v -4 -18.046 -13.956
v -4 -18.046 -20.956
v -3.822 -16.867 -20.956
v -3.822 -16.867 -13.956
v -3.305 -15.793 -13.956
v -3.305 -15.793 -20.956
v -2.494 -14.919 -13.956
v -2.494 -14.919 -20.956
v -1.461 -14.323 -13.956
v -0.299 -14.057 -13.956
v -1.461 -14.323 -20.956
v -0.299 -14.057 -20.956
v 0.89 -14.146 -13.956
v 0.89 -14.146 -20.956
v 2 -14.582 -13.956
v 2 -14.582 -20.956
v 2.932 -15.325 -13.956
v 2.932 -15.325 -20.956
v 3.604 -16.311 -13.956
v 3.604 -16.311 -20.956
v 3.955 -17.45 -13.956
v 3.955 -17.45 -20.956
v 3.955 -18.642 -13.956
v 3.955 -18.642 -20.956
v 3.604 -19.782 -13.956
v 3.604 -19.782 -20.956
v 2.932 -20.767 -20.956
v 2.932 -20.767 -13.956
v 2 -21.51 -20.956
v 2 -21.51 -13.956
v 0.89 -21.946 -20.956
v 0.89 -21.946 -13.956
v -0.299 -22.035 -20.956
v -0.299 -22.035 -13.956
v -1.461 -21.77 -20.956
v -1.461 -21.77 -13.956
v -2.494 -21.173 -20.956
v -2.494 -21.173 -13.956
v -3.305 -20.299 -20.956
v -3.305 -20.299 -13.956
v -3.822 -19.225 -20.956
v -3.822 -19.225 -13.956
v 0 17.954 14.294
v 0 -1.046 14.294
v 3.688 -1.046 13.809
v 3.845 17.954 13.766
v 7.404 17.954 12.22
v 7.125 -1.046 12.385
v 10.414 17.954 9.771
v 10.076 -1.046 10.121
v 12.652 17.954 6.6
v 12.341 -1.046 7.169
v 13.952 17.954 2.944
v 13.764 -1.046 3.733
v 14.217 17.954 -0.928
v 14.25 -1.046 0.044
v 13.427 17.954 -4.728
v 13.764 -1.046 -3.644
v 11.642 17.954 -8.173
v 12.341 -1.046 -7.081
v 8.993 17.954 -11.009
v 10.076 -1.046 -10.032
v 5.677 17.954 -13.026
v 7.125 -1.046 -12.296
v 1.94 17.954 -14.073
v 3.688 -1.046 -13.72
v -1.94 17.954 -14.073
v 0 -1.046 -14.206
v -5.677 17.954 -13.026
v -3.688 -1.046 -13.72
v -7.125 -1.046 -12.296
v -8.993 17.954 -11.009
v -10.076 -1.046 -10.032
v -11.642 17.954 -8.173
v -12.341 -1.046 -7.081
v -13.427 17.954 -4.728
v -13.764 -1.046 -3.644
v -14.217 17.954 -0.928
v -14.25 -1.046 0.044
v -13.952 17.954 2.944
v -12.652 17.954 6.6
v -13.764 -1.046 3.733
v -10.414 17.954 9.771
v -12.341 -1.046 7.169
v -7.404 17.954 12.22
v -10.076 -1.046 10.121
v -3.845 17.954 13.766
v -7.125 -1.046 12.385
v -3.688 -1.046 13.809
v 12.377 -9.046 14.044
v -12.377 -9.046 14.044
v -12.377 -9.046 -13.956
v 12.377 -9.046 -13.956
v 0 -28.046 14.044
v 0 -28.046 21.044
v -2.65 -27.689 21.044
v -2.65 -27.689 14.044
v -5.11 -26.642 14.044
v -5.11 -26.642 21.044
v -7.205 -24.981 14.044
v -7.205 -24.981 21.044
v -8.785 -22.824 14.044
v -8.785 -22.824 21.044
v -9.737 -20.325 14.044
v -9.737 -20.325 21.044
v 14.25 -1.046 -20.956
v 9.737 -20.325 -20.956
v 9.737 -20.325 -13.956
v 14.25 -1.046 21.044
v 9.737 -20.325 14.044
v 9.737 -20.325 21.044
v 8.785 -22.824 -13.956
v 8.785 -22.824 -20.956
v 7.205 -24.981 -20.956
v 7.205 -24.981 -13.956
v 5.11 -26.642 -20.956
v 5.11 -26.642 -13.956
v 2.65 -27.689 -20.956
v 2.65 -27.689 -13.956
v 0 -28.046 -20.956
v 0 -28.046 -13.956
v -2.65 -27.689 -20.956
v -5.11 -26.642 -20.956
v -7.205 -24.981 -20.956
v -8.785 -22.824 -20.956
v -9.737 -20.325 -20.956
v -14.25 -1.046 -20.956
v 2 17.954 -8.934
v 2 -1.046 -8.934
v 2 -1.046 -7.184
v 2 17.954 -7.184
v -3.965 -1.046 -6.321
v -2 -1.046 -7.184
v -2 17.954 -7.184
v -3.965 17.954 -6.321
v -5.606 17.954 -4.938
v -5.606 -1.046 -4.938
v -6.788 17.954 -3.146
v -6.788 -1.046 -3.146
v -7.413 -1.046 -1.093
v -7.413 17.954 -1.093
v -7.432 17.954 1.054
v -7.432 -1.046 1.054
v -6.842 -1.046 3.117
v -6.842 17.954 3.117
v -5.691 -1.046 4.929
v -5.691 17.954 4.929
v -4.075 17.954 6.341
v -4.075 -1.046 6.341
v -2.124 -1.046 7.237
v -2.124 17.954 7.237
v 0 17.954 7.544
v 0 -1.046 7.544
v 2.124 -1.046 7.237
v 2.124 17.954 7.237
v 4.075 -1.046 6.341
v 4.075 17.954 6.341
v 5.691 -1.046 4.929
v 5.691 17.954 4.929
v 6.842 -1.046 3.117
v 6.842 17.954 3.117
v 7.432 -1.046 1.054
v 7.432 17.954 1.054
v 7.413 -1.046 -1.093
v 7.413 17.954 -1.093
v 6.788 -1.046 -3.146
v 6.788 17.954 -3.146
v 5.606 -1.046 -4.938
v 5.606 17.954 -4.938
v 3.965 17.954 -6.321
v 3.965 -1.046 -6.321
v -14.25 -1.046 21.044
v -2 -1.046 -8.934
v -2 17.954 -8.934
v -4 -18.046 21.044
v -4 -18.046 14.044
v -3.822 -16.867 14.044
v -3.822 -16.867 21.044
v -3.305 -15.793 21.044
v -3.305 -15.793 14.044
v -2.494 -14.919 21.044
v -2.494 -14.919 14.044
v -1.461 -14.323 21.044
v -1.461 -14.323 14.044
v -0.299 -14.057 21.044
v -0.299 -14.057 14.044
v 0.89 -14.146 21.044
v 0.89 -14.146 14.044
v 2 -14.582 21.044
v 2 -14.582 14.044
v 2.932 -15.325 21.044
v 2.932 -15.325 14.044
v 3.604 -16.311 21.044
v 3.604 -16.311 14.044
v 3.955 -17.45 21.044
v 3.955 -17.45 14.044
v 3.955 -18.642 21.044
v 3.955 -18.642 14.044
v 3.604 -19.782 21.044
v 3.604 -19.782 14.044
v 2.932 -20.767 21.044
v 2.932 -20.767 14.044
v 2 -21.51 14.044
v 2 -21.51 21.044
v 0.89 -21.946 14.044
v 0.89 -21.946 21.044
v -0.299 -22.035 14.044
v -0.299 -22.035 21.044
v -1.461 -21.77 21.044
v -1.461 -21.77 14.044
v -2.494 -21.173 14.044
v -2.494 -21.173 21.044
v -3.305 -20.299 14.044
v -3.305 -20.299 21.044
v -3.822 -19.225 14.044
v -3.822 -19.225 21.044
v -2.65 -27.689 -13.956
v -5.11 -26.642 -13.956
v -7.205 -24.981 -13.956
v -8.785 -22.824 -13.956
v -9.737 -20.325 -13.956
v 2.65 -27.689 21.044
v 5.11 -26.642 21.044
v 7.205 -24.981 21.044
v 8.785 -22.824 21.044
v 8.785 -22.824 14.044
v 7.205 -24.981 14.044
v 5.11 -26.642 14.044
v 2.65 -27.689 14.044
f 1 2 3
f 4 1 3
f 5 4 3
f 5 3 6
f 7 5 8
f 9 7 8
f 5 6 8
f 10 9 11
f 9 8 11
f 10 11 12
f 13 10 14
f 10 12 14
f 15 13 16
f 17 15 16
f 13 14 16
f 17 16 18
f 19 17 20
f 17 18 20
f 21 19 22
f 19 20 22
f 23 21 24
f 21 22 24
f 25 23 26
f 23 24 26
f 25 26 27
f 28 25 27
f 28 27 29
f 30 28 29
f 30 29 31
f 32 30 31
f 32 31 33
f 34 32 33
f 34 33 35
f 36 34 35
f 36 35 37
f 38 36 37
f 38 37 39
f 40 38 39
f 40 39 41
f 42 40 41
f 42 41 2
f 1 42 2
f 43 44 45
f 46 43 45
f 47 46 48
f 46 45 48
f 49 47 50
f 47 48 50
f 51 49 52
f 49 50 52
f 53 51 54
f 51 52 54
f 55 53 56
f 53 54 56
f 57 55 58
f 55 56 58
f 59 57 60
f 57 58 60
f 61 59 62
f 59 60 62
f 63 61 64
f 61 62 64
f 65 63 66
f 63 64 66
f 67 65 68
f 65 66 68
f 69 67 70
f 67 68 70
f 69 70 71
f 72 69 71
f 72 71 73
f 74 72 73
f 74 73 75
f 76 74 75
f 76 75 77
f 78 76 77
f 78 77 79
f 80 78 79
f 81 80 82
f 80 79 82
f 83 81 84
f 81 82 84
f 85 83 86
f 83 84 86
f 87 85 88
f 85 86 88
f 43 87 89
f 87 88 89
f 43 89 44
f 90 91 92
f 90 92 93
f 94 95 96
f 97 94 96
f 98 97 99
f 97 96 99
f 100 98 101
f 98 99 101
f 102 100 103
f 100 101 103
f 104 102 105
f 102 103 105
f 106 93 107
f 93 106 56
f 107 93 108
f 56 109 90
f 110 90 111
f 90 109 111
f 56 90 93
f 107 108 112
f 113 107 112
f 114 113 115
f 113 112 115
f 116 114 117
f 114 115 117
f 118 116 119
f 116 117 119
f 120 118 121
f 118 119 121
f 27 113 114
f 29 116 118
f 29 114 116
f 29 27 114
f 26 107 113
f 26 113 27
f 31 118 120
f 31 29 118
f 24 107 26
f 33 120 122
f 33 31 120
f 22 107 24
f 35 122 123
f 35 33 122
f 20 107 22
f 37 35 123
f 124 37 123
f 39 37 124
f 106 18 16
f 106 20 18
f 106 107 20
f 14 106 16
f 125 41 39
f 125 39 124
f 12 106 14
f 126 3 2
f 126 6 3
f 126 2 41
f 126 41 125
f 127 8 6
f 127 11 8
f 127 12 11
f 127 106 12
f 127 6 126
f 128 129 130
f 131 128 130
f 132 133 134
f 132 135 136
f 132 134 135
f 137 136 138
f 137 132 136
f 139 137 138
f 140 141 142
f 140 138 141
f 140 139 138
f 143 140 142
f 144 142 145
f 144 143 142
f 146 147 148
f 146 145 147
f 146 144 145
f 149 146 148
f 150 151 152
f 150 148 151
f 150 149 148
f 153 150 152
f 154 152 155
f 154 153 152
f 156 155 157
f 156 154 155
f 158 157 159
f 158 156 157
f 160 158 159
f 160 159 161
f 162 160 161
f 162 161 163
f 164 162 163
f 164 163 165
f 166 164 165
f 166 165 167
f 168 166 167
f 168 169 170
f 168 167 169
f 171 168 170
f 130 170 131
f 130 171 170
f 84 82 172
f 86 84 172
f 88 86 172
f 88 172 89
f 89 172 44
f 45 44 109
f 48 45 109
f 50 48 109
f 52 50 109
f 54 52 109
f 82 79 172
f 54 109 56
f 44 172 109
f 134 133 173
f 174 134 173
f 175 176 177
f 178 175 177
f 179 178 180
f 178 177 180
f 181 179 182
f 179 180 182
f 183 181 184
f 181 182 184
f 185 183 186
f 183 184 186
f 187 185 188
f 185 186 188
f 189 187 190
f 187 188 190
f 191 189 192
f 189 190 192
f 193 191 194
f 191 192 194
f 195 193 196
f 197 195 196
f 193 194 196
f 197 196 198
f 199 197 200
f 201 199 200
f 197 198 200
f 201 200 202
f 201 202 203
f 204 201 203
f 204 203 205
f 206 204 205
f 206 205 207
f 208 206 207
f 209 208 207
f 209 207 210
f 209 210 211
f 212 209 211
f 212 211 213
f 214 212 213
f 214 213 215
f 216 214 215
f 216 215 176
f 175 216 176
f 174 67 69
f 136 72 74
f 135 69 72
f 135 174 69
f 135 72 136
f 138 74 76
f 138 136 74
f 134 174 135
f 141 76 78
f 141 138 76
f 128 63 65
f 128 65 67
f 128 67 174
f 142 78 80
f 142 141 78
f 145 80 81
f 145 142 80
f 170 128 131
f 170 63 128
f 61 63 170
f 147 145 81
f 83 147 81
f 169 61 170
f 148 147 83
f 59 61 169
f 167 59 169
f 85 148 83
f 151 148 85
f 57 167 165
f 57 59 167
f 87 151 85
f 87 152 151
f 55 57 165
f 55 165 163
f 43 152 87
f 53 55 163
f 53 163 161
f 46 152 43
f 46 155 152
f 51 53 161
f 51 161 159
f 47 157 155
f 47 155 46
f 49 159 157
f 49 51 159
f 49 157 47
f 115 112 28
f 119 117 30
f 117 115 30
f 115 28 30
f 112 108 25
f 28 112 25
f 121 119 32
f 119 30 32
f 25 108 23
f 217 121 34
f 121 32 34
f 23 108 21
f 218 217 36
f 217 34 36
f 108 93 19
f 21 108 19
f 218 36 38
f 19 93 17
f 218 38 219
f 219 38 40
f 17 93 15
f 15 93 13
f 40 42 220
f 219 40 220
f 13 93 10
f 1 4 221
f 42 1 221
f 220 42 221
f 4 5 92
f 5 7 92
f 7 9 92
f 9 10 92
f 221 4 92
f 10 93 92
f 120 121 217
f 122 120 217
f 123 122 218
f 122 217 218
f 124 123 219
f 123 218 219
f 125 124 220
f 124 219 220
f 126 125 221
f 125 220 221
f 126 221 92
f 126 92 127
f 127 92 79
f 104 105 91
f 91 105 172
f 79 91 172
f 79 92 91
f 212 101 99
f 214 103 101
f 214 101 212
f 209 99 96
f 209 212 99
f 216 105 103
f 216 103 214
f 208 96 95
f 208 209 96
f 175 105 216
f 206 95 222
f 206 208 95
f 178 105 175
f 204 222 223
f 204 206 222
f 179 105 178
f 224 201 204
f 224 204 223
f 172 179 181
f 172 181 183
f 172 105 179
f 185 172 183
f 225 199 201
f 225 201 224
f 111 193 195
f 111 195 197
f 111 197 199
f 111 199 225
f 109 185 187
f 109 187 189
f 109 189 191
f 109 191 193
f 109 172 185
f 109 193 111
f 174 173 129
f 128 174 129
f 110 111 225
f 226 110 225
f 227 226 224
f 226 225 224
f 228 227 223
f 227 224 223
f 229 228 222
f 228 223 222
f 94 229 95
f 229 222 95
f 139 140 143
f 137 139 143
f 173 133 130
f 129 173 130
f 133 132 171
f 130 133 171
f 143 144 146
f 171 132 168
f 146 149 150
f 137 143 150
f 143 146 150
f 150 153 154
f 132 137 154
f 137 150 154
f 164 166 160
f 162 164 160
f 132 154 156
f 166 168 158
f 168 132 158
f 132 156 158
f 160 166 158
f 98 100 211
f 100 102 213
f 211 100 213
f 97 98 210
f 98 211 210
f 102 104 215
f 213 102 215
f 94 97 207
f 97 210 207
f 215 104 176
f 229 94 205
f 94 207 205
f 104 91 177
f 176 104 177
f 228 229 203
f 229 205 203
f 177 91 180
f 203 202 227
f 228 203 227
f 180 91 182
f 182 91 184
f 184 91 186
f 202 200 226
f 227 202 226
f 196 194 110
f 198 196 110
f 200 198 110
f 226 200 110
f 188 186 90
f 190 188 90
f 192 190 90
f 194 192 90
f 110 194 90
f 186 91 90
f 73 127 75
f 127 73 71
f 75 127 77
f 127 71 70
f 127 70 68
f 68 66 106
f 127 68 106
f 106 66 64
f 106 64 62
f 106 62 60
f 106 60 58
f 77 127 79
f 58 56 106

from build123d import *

# Parameters (mm, degrees)
SKETCH1_R           = 28.5
SKETCH1_R_2         = 15
BOSS_EXTRUDE1_DEPTH = 38
SKETCH2_W           = 57
SKETCH2_H           = 84
BOSS_EXTRUDE2_DEPTH = 16
SKETCH6_W           = 57
SKETCH6_H           = 38
BOSS_EXTRUDE4_DEPTH = 14
SKETCH7_W           = 57
SKETCH7_H           = 38
BOSS_EXTRUDE5_DEPTH = 14
SKETCH8_R           = 8
CUT_EXTRUDE3_DEPTH  = 104.847243584
CUT_EXTRUDE4_DEPTH  = 104.847243584
CUT_EXTRUDE5_START  = -38
CUT_EXTRUDE5_DEPTH  = 38
ESCALA1_SCALE       = 0.5


with BuildPart() as part:
    # Sketch1 → Boss-Extrude1 (new body)
    with BuildSketch(Plane(origin=(0, 0, 0), x_dir=(1, 0, 0), z_dir=(0, 1, 0))):
        with Locations(Location((0, 0, 0), (0, 0, 270))):
            Circle(SKETCH1_R)
        with Locations(Location((0, 0, 0), (0, 0, 270))):
            Circle(SKETCH1_R_2, mode=Mode.SUBTRACT)
    extrude(amount=BOSS_EXTRUDE1_DEPTH)

    # Sketch2 → Boss-Extrude2 (add)
    with BuildSketch(Plane.XZ):
        Rectangle(SKETCH2_W, SKETCH2_H)
    extrude(amount=BOSS_EXTRUDE2_DEPTH)

    # Sketch6 → Boss-Extrude4 (add)
    with BuildSketch(Plane.XY.offset(42)):
        with Locations((0, -35)):
            Rectangle(SKETCH6_W, SKETCH6_H)
    extrude(amount=-BOSS_EXTRUDE4_DEPTH)

    # Sketch7 → Boss-Extrude5 (add)
    with BuildSketch(Plane(origin=(0, 0, -42), x_dir=(-1, 0, 0), z_dir=(0, 0, -1))):
        with Locations((0, -35)):
            Rectangle(SKETCH7_W, SKETCH7_H)
    extrude(amount=-BOSS_EXTRUDE5_DEPTH)

    # Sketch8 → Cut-Extrude3 (cut, through all)
    with BuildSketch(Plane(origin=(0, 0, -42), x_dir=(-1, 0, 0), z_dir=(0, 0, -1))):
        with Locations((0, -34)):
            Circle(SKETCH8_R)
    extrude(amount=-CUT_EXTRUDE3_DEPTH, mode=Mode.SUBTRACT)

    # Sketch9 → Cut-Extrude4 (cut, through all)
    with BuildSketch(Plane.XY.offset(42)):
        with BuildLine():
            Line((-19.473528625, -38.558693112), (-28.5, 0))
            Line((-28.5, 0), (-28.5, -54))
            Line((-28.5, -54), (0, -54))
            ThreePointArc((0, -54), (-12.42630552, -49.671213454), (-19.473528625, -38.558693112))
        make_face()
        with BuildLine():
            ThreePointArc((19.473522225, -38.558720453), (12.426294519, -49.671222177), (0, -54))
            Line((0, -54), (28.5, -54))
            Line((28.5, -54), (28.5, 0))
            Line((28.5, 0), (19.473522225, -38.558720453))
        make_face()
    extrude(amount=-CUT_EXTRUDE4_DEPTH, mode=Mode.SUBTRACT)

    # Sketch11 → Cut-Extrude5 (cut)
    with BuildSketch(Plane(origin=(0, 38, 0), x_dir=(1, 0, 0), z_dir=(0, 1, 0)).offset(CUT_EXTRUDE5_START)):
        with BuildLine():
            Line((-4, 17.956832295), (4, 17.956832295))
            Line((4, 17.956832295), (4, 14.456832295))
            ThreePointArc((4, 14.456832295), (0, 15), (-4, 14.456832295))
            Line((-4, 14.456832295), (-4, 17.956832295))
        make_face()
    extrude(amount=CUT_EXTRUDE5_DEPTH, mode=Mode.SUBTRACT)


with BuildPart() as part_1:
    # Escala1: scaled about (0, -2.092250253, 0.088985483)
    add(part.part.scale(ESCALA1_SCALE).moved(Location((0, -1.046125127, 0.044492742))))


solid = part_1.part
